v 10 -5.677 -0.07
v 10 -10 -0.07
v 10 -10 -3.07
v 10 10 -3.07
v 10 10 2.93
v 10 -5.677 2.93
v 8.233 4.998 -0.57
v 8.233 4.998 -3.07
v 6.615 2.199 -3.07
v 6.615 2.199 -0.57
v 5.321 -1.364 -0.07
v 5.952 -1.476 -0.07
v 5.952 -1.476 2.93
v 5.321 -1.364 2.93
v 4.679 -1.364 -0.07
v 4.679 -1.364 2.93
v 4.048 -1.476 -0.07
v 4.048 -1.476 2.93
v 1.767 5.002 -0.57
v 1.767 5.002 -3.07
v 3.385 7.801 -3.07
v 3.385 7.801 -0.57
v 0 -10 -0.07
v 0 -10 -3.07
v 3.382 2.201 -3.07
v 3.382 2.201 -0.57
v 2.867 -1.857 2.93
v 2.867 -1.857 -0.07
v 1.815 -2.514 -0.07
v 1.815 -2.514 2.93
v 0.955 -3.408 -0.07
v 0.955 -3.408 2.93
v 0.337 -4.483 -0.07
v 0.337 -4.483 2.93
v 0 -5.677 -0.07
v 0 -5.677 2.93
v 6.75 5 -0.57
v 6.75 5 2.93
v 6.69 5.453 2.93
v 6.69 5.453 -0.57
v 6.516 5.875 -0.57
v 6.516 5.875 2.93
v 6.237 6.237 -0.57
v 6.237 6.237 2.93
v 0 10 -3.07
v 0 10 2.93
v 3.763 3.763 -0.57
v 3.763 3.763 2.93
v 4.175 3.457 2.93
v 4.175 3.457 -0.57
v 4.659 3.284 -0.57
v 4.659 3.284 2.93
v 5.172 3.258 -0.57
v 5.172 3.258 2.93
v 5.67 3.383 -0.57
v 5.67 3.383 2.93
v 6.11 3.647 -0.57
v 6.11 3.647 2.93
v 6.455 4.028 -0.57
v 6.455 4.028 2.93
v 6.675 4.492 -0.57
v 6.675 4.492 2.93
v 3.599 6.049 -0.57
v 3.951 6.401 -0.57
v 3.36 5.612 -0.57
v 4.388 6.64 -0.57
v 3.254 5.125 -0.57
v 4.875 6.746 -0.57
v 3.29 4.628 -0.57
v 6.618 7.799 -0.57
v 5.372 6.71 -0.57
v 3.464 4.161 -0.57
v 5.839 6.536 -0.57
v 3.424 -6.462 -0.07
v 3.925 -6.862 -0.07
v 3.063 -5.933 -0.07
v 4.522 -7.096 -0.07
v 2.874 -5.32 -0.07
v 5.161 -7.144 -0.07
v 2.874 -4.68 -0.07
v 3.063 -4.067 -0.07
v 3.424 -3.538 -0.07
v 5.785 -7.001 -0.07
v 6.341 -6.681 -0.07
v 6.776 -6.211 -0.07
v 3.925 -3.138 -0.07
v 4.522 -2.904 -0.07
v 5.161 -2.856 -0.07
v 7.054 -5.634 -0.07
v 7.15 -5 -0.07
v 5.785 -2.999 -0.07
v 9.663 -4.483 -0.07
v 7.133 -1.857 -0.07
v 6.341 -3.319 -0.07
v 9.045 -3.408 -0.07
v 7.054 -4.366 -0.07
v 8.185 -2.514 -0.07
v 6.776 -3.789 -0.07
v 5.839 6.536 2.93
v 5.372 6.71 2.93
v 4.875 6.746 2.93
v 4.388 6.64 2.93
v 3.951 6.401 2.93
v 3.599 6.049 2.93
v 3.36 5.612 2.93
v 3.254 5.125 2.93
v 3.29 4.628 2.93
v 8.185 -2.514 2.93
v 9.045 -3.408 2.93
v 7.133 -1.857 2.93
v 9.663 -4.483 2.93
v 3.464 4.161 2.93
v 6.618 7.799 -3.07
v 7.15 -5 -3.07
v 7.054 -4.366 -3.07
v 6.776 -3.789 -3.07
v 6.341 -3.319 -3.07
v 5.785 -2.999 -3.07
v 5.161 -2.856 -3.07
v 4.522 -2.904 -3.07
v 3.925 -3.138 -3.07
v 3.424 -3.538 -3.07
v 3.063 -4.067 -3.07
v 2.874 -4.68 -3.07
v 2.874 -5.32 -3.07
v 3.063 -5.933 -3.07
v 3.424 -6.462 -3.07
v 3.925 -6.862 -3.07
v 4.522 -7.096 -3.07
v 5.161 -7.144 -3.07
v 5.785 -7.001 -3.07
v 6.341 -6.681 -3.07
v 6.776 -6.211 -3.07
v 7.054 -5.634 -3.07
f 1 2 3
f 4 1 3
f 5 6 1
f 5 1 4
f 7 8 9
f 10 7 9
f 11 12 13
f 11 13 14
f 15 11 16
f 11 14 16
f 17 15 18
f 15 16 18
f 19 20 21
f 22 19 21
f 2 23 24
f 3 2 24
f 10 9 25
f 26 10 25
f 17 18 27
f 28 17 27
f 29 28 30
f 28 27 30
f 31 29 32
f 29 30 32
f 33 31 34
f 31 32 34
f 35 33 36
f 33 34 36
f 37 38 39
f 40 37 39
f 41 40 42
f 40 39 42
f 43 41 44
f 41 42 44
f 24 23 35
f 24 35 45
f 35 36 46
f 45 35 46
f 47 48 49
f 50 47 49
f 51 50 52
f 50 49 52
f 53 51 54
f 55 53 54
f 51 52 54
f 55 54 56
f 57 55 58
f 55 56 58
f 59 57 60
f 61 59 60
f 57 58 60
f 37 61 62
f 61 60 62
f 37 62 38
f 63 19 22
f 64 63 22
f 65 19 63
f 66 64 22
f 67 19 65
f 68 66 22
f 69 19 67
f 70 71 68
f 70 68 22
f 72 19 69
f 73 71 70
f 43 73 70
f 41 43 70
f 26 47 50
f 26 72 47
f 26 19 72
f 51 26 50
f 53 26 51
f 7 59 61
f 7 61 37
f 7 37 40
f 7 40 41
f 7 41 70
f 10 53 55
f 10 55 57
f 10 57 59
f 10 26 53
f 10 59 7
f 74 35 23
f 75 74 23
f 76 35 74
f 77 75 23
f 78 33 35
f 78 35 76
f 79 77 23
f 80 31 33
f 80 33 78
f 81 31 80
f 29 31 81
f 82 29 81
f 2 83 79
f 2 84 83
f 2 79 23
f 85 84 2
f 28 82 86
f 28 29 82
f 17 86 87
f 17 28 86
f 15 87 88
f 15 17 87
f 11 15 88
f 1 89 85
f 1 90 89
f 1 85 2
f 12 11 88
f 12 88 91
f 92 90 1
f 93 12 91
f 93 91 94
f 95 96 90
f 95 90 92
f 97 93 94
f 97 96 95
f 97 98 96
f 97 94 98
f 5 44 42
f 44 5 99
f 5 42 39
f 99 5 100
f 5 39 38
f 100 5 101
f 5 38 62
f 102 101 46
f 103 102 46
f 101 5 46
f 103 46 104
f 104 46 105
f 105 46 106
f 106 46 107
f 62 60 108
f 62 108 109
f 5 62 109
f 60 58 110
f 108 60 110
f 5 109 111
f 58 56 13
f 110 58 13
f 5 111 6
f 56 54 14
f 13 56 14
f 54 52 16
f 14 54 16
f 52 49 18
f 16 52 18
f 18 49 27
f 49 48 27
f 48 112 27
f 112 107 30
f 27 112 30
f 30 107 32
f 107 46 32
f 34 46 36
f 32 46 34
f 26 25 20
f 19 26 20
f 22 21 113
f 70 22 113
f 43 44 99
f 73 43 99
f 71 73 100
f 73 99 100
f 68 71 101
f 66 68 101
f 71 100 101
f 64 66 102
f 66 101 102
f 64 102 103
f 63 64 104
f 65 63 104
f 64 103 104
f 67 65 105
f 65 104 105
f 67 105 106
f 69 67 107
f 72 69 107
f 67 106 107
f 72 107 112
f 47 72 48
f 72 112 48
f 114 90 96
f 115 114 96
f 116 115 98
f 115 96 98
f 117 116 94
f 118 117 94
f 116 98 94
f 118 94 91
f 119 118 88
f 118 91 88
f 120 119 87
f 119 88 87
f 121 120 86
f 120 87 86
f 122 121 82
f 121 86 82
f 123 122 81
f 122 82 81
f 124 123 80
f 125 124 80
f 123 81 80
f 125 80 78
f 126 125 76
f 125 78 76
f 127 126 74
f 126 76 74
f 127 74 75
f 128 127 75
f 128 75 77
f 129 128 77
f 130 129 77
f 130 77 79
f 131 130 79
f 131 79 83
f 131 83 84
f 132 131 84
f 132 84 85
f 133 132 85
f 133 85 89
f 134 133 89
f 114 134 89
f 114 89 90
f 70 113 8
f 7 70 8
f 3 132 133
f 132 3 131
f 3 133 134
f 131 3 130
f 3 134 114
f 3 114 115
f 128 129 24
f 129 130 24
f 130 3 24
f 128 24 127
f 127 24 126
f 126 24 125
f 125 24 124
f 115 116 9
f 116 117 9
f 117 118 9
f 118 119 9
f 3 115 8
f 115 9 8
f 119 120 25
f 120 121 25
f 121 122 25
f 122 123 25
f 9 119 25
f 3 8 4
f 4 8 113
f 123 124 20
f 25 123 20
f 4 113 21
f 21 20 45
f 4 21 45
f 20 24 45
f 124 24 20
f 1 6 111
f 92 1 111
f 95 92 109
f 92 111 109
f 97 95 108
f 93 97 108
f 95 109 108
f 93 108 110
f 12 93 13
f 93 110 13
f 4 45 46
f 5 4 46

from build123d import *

# Parameters (mm, degrees)
F0_W     = 10
F0_H     = 3
F1_DEPTH = 10
F2_R     = 2.15
F3_DEPTH = 6
F5_DEPTH = 2.5
F6_R     = 3.65
F7_DEPTH = 3
F9_DEPTH = 3


with BuildPart() as f1:
    # F0 (on Right) → F1 (new body)
    with BuildSketch(Plane.YZ):
        Polygon((-10, -3.0702352835), (10, -3.0702352835), (10, 2.9297647165), (-10, 2.9297647165), (-10, 1.4297647165), (0, 1.4297647165), (0, -1.5702352835), (-10, -1.5702352835), align=None)
        with Locations((-5, -0.0702352835)):
            Rectangle(F0_W, F0_H)
    extrude(amount=F1_DEPTH)

    # F2 (on face) → F3 (cut, through all)
    with BuildSketch(Plane.XY.offset(2.9297647165)):
        with Locations((5, -5)):
            Circle(F2_R)
        with BuildLine():
            ThreePointArc((6.75, 5), (6.6167891819, 5.6696960066), (6.2374368671, 6.2374368671))
            Line((6.2374368671, 6.2374368671), (3.7625631329, 3.7625631329))
            ThreePointArc((3.7625631329, 3.7625631329), (5.6696960066, 3.3832108181), (6.75, 5))
        make_face()
        with BuildLine():
            Line((3.7625631329, 3.7625631329), (6.2374368671, 6.2374368671))
            ThreePointArc((6.2374368671, 6.2374368671), (3.7625631329, 6.2374368671), (3.7625631329, 3.7625631329))
        make_face()
    extrude(amount=-F3_DEPTH, mode=Mode.SUBTRACT)

    # F4 (on face) → F5 (cut)
    with BuildSketch(Plane(origin=(0, 0, -3.0702352835), x_dir=(1, 0, 0), z_dir=(0, 0, -1))):
        Polygon((1.7668389044, -5.0016318656), (3.3848326892, -7.8008155761), (6.6179937849, -7.7991837106), (8.2331610956, -4.9983681344), (6.6151673108, -2.1991844239), (3.3820062151, -2.2008162894), align=None)
    extrude(amount=-F5_DEPTH, mode=Mode.SUBTRACT)

    # F6 (on face) → F7 (cut)
    with BuildSketch(Plane.XY.offset(2.9297647165)):
        with Locations((5, -5)):
            Circle(F6_R)
    extrude(amount=-F7_DEPTH, mode=Mode.SUBTRACT)

    # F8 (on face) → F9 (cut)
    with BuildSketch(Plane.XY.offset(2.9297647165)):
        with BuildLine():
            Line((0, -5.6770486943), (0, -10))
            Line((0, -10), (10, -10))
            Line((10, -10), (10, -5.6770486943))
            ThreePointArc((10, -5.6770486943), (5, -1.3859687615), (0, -5.6770486943))
        make_face()
    extrude(amount=-F9_DEPTH, mode=Mode.SUBTRACT)


solid = f1.part
